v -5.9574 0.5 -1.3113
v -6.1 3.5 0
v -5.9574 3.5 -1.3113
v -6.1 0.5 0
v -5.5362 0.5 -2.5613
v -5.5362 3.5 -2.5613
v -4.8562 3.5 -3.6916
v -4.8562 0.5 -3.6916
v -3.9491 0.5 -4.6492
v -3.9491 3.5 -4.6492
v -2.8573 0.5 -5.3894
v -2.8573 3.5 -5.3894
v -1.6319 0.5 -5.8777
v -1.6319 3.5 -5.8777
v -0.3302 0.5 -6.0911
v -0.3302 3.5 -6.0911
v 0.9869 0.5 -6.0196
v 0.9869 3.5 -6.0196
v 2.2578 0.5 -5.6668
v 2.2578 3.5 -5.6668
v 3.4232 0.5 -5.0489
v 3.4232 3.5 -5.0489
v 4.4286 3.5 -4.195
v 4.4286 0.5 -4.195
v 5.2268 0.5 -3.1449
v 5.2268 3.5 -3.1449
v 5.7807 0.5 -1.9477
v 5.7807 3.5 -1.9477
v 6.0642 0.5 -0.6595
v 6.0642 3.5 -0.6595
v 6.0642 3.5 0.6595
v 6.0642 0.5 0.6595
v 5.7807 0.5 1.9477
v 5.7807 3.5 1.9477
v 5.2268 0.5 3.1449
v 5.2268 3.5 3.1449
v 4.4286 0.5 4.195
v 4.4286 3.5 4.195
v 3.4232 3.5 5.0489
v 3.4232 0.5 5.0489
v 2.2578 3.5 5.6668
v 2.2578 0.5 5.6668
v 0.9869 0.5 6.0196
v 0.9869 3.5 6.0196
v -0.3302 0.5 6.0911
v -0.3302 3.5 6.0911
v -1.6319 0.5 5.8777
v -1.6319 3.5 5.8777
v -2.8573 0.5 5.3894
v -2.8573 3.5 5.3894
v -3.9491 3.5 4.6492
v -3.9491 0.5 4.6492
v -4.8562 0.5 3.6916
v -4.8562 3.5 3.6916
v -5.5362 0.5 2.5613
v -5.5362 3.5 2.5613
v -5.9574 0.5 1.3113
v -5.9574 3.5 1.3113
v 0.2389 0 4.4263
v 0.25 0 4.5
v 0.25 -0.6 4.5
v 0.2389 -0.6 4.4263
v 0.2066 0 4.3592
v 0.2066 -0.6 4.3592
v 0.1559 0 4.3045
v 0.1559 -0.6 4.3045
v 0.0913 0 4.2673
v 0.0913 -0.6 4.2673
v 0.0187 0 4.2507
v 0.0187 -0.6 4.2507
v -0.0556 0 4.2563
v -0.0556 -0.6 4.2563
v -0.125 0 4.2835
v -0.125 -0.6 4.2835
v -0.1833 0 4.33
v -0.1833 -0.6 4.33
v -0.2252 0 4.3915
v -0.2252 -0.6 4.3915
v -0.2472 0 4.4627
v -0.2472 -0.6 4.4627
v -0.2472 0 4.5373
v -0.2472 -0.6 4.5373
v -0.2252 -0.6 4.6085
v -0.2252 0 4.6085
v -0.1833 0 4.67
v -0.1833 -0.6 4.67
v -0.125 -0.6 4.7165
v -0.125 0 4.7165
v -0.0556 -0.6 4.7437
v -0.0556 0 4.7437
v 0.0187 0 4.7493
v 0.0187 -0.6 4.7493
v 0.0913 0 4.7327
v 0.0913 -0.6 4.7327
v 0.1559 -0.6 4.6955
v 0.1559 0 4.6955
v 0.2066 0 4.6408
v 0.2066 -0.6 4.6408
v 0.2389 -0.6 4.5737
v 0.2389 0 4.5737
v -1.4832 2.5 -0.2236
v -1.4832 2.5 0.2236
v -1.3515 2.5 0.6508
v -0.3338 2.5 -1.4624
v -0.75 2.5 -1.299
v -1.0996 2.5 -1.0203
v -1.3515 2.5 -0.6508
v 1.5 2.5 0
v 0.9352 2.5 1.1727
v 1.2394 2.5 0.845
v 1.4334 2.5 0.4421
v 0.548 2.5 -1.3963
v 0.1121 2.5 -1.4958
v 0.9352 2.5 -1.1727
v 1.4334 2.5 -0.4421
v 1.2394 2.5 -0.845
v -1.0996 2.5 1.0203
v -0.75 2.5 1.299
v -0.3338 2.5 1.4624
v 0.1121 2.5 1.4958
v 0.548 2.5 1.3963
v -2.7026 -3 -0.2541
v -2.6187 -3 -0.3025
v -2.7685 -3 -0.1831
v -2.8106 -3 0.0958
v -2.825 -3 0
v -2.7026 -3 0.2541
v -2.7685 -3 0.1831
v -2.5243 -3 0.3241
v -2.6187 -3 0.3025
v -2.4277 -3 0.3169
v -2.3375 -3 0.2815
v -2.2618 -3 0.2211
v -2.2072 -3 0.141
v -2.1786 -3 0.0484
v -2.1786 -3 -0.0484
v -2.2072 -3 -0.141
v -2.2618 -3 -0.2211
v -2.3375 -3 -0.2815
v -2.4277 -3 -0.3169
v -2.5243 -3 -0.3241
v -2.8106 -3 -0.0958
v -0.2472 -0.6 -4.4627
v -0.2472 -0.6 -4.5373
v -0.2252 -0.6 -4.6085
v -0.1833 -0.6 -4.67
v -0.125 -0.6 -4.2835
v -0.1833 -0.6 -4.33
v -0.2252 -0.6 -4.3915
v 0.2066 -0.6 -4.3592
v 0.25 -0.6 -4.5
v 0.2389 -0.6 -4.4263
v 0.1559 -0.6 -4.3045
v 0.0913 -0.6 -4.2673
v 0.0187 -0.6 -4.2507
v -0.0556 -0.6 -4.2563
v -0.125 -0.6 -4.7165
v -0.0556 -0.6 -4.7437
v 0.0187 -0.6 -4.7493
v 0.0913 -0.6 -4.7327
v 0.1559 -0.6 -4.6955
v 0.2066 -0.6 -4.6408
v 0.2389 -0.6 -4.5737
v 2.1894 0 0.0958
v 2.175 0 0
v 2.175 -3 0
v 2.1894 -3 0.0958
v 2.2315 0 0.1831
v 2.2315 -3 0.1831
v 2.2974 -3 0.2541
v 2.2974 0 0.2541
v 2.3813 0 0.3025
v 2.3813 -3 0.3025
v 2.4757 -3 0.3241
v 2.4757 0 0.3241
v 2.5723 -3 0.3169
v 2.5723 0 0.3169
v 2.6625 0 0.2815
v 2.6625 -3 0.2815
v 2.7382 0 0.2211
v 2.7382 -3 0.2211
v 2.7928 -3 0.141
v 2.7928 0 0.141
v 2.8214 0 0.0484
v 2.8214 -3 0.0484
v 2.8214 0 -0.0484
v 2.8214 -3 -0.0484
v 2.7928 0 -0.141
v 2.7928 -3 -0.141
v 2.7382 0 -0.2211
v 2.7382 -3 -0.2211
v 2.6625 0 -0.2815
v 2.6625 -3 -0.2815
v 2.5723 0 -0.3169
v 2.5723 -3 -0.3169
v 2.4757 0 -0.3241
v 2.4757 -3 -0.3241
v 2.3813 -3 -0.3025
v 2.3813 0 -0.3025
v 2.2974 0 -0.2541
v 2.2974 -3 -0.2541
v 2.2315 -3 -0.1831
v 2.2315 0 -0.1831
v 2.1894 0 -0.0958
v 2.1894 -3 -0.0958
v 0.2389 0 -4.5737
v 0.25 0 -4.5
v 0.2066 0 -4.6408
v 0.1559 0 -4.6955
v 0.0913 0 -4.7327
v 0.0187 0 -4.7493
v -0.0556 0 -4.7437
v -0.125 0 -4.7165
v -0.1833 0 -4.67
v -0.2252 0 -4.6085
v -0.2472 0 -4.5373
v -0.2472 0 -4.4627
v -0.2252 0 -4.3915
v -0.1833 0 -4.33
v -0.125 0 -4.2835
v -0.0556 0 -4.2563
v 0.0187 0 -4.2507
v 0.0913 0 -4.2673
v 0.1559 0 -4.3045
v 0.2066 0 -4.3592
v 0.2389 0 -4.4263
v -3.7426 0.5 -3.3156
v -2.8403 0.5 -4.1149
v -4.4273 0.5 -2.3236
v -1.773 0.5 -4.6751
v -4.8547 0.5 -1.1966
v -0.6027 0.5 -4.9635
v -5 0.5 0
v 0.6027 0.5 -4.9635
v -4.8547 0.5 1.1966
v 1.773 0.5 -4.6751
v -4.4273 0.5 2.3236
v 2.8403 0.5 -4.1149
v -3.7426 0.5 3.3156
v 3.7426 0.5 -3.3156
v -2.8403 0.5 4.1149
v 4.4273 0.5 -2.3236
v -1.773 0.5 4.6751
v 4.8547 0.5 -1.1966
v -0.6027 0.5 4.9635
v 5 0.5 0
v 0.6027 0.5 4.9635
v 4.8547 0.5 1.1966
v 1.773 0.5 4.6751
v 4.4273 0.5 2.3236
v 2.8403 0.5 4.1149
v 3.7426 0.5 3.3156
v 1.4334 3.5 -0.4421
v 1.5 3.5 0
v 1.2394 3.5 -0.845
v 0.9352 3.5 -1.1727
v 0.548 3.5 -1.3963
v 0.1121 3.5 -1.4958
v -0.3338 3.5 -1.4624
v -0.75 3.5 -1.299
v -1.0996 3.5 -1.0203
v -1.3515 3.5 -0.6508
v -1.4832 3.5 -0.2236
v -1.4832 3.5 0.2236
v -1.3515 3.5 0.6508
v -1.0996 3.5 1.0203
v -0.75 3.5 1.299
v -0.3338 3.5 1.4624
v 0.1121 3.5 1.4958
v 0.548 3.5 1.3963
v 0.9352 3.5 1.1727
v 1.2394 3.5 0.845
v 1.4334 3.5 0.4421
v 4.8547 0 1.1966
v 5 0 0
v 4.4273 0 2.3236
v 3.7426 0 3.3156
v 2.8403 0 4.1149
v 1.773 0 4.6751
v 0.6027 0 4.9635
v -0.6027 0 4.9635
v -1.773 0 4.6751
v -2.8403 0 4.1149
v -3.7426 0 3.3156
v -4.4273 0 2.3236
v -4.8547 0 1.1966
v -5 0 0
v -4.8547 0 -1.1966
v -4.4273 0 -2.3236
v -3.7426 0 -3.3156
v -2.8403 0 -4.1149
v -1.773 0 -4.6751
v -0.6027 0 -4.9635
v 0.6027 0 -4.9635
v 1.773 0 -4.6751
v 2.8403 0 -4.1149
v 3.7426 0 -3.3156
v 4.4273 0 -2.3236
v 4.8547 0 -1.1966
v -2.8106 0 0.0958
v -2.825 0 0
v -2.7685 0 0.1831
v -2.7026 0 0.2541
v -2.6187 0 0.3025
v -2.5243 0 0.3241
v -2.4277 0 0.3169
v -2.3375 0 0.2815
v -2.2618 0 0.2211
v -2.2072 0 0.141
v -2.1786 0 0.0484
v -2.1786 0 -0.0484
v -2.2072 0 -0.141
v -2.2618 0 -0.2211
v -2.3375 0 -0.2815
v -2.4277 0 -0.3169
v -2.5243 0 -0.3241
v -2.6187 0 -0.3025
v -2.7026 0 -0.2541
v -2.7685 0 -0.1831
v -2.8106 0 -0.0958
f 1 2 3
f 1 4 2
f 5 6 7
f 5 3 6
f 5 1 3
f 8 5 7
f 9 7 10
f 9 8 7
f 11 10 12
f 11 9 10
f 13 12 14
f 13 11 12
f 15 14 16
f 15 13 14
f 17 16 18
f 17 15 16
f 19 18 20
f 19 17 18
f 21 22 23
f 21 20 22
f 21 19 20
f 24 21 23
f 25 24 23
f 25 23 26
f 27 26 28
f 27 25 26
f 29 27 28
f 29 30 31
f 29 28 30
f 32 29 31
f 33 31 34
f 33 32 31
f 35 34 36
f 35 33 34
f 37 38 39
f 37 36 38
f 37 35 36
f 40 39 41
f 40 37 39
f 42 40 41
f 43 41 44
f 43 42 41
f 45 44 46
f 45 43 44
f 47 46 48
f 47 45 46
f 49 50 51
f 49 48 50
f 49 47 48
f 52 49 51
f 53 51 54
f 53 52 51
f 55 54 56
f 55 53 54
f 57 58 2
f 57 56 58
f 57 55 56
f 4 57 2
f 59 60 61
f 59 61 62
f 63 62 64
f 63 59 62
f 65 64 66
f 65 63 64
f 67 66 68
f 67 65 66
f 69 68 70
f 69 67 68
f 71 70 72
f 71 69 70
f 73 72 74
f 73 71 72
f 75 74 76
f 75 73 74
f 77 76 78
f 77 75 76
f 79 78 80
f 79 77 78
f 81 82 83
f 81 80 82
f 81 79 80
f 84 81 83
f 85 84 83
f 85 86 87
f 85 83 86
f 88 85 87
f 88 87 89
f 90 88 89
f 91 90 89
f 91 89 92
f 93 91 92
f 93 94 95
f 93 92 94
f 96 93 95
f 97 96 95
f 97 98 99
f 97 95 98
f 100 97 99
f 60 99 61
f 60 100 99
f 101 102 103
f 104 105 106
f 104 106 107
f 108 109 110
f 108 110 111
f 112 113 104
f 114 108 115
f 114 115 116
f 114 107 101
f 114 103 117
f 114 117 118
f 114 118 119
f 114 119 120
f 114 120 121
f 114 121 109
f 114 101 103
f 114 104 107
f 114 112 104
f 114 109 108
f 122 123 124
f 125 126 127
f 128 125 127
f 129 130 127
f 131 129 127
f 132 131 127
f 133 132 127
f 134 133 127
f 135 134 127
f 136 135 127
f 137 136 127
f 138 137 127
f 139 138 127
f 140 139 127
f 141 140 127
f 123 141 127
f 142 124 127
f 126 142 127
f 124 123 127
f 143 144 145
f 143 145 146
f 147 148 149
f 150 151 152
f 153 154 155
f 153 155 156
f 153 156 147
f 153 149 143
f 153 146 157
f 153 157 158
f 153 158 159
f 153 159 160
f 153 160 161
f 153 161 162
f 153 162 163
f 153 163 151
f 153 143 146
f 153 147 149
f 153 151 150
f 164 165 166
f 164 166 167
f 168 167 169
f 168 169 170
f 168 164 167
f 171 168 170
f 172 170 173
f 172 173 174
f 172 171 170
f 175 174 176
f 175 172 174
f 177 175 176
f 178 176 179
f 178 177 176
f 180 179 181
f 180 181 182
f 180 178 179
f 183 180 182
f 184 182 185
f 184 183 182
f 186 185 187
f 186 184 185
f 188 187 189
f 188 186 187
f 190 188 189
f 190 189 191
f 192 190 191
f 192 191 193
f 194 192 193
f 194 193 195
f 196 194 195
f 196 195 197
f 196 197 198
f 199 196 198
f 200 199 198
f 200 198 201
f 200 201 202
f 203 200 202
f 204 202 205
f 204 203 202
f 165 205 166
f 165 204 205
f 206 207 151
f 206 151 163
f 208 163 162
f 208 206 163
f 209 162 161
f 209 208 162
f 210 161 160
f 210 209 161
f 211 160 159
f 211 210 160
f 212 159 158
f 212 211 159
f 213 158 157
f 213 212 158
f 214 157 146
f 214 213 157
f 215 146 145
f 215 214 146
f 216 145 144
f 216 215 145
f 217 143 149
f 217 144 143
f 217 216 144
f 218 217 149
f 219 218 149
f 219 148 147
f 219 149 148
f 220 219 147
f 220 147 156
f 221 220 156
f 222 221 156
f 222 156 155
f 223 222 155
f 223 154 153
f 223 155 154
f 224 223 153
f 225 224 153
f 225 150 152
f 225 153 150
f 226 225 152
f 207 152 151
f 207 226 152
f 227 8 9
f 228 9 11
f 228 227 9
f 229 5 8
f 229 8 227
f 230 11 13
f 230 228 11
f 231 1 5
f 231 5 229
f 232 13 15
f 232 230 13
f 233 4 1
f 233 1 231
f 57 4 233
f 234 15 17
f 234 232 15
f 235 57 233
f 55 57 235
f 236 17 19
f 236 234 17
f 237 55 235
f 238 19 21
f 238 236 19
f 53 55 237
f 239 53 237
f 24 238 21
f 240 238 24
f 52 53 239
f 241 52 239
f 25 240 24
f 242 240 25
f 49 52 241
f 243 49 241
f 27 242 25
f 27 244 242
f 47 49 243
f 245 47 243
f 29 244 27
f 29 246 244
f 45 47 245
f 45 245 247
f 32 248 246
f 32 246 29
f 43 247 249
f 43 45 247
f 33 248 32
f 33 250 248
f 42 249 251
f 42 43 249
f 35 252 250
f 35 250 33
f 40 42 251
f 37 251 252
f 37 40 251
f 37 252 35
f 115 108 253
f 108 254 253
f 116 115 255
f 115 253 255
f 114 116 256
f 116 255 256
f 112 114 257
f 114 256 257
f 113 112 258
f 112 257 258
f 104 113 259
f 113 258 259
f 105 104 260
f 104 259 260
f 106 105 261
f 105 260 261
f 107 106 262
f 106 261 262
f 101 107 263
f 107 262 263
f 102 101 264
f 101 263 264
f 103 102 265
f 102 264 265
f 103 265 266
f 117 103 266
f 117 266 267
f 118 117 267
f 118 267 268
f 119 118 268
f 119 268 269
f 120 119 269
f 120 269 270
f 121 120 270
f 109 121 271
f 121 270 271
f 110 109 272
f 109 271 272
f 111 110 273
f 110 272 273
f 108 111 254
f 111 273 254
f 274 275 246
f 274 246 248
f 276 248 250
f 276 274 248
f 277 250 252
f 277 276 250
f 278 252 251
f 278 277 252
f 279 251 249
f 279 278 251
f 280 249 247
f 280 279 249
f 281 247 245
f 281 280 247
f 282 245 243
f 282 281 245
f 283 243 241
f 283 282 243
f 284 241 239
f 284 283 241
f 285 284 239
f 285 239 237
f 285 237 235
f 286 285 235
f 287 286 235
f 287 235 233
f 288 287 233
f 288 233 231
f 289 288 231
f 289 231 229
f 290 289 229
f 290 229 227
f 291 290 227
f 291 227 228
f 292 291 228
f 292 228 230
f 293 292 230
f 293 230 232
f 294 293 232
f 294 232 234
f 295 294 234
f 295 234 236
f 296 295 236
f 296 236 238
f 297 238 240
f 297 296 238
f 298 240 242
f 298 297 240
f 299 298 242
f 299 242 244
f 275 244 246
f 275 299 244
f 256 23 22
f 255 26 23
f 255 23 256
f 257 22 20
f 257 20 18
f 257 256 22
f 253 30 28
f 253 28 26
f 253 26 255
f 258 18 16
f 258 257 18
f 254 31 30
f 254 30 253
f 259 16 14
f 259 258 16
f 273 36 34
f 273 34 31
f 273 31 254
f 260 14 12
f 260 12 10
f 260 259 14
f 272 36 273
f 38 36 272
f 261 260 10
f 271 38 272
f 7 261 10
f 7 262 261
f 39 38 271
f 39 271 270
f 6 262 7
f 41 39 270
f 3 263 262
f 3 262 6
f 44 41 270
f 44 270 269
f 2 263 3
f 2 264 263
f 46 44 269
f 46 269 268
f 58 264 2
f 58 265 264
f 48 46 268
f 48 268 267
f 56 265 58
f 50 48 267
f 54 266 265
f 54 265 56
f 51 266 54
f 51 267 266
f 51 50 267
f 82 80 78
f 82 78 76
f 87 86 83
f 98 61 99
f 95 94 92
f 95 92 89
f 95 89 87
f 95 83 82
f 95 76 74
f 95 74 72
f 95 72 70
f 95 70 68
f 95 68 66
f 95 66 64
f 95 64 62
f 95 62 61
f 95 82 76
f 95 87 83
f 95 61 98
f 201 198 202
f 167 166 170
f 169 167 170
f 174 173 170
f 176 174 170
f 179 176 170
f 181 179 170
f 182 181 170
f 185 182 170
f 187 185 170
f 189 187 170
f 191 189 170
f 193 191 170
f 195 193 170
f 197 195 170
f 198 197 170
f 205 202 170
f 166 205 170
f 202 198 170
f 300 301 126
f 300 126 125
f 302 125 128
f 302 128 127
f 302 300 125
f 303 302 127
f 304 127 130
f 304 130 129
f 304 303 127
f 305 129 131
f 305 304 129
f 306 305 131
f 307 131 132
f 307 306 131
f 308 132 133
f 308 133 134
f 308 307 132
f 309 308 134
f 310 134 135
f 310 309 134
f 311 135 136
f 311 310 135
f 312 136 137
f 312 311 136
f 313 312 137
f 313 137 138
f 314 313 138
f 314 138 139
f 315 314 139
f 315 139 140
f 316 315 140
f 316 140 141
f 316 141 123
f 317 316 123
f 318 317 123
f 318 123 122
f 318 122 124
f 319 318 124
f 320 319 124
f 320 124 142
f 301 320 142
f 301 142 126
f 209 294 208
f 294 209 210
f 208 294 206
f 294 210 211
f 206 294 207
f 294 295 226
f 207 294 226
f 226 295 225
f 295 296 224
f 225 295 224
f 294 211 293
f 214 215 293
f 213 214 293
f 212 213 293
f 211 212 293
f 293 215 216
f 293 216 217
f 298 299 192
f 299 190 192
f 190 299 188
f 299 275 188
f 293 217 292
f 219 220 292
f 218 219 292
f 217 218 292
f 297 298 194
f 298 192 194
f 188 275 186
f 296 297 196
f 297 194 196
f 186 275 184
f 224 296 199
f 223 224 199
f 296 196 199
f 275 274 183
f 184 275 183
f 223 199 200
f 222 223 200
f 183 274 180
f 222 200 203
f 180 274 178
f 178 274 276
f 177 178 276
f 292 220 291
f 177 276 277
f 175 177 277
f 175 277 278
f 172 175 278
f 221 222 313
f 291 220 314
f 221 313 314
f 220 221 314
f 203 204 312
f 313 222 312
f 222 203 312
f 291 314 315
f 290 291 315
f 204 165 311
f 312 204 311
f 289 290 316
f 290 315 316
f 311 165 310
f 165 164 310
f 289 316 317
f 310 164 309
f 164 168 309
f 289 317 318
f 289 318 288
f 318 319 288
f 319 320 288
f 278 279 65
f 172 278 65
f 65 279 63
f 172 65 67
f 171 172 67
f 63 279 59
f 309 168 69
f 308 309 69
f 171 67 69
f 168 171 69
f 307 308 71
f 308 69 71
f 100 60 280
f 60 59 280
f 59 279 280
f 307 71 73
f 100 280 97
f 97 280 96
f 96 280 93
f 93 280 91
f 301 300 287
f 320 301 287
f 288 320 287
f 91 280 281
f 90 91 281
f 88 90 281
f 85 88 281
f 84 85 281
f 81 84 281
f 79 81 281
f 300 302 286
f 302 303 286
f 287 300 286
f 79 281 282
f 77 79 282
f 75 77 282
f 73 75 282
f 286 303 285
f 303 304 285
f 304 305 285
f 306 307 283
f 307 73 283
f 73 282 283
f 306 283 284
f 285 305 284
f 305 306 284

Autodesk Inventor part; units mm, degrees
ref_plane "YZ Plane" through (0, 0, 0) normal (1, 0, 0) x (0, 1, 0)
ref_plane "XZ Plane" through (0, 0, 0) normal (0, 1, 0) x (-1, 0, 0)
ref_plane "XY Plane" through (0, 0, 0) normal (0, 0, 1) x (1, 0, 0)
sketch "Sketch1" plane through (0, 0, 0) normal (0, 1, 0) x (-1, 0, 0)
  circle A0 centre (0, 0) radius 6.1
  dimension "d0" = 12.2
extrude "Extrusion1" add sketch "Sketch1" along normal blind 3.5
sketch "Sketch2" plane through (0, 3.5, 0) normal (0, 1, 0) x (1, 0, 0)
  circle A0 centre (0, 0) radius 1.5
  dimension "d3" = 3
extrude "Extrusion2" cut sketch "Sketch2" against normal blind 1
sketch "Sketch3" plane through (0, 0, 0) normal (0, -1, 0) x (1, 0, 0)
  circle A0 centre (0, 0) radius 5
  circle A1 centre (0, 0) radius 6.1 projected
  dimension "d6" = 10
extrude "Extrusion3" cut sketch "Sketch3" against normal blind 0.5
sketch "Sketch4" plane through (0, 0, 0) normal (0, 1, 0) x (-1, 0, 0)
  line L0 (-8.54, 0) -> (8.54, 0) construction
  circle A0 centre (-2.5, 0) radius 0.325
  circle A1 centre (2.5, 0) radius 0.325
  line L1 (0, -8.54) -> (0, 8.54) construction
  point P0 (0, 0)
  dimension "d9" = 0.65
  dimension "d10" = 0.65
  dimension "d11" = 5
extrude "Extrusion4" add sketch "Sketch4" against normal blind 3
sketch "Sketch5" plane through (0, 0, 0) normal (0, -1, 0) x (1, 0, 0)
  line L0 (0, 8.54) -> (0, -8.54) construction
  line L1 (-8.54, 0) -> (8.54, 0) construction
  circle A0 centre (0, -4.5) radius 0.25
  circle A1 centre (0, 4.5) radius 0.25
  point P0 (0, 0)
  dimension "d14" = 0.5
  dimension "d15" = 0.5
  dimension "d16" = 9
extrude "Extrusion5" add sketch "Sketch5" along normal blind 0.6
properties part number "BUZZER_TDK_PS12"
